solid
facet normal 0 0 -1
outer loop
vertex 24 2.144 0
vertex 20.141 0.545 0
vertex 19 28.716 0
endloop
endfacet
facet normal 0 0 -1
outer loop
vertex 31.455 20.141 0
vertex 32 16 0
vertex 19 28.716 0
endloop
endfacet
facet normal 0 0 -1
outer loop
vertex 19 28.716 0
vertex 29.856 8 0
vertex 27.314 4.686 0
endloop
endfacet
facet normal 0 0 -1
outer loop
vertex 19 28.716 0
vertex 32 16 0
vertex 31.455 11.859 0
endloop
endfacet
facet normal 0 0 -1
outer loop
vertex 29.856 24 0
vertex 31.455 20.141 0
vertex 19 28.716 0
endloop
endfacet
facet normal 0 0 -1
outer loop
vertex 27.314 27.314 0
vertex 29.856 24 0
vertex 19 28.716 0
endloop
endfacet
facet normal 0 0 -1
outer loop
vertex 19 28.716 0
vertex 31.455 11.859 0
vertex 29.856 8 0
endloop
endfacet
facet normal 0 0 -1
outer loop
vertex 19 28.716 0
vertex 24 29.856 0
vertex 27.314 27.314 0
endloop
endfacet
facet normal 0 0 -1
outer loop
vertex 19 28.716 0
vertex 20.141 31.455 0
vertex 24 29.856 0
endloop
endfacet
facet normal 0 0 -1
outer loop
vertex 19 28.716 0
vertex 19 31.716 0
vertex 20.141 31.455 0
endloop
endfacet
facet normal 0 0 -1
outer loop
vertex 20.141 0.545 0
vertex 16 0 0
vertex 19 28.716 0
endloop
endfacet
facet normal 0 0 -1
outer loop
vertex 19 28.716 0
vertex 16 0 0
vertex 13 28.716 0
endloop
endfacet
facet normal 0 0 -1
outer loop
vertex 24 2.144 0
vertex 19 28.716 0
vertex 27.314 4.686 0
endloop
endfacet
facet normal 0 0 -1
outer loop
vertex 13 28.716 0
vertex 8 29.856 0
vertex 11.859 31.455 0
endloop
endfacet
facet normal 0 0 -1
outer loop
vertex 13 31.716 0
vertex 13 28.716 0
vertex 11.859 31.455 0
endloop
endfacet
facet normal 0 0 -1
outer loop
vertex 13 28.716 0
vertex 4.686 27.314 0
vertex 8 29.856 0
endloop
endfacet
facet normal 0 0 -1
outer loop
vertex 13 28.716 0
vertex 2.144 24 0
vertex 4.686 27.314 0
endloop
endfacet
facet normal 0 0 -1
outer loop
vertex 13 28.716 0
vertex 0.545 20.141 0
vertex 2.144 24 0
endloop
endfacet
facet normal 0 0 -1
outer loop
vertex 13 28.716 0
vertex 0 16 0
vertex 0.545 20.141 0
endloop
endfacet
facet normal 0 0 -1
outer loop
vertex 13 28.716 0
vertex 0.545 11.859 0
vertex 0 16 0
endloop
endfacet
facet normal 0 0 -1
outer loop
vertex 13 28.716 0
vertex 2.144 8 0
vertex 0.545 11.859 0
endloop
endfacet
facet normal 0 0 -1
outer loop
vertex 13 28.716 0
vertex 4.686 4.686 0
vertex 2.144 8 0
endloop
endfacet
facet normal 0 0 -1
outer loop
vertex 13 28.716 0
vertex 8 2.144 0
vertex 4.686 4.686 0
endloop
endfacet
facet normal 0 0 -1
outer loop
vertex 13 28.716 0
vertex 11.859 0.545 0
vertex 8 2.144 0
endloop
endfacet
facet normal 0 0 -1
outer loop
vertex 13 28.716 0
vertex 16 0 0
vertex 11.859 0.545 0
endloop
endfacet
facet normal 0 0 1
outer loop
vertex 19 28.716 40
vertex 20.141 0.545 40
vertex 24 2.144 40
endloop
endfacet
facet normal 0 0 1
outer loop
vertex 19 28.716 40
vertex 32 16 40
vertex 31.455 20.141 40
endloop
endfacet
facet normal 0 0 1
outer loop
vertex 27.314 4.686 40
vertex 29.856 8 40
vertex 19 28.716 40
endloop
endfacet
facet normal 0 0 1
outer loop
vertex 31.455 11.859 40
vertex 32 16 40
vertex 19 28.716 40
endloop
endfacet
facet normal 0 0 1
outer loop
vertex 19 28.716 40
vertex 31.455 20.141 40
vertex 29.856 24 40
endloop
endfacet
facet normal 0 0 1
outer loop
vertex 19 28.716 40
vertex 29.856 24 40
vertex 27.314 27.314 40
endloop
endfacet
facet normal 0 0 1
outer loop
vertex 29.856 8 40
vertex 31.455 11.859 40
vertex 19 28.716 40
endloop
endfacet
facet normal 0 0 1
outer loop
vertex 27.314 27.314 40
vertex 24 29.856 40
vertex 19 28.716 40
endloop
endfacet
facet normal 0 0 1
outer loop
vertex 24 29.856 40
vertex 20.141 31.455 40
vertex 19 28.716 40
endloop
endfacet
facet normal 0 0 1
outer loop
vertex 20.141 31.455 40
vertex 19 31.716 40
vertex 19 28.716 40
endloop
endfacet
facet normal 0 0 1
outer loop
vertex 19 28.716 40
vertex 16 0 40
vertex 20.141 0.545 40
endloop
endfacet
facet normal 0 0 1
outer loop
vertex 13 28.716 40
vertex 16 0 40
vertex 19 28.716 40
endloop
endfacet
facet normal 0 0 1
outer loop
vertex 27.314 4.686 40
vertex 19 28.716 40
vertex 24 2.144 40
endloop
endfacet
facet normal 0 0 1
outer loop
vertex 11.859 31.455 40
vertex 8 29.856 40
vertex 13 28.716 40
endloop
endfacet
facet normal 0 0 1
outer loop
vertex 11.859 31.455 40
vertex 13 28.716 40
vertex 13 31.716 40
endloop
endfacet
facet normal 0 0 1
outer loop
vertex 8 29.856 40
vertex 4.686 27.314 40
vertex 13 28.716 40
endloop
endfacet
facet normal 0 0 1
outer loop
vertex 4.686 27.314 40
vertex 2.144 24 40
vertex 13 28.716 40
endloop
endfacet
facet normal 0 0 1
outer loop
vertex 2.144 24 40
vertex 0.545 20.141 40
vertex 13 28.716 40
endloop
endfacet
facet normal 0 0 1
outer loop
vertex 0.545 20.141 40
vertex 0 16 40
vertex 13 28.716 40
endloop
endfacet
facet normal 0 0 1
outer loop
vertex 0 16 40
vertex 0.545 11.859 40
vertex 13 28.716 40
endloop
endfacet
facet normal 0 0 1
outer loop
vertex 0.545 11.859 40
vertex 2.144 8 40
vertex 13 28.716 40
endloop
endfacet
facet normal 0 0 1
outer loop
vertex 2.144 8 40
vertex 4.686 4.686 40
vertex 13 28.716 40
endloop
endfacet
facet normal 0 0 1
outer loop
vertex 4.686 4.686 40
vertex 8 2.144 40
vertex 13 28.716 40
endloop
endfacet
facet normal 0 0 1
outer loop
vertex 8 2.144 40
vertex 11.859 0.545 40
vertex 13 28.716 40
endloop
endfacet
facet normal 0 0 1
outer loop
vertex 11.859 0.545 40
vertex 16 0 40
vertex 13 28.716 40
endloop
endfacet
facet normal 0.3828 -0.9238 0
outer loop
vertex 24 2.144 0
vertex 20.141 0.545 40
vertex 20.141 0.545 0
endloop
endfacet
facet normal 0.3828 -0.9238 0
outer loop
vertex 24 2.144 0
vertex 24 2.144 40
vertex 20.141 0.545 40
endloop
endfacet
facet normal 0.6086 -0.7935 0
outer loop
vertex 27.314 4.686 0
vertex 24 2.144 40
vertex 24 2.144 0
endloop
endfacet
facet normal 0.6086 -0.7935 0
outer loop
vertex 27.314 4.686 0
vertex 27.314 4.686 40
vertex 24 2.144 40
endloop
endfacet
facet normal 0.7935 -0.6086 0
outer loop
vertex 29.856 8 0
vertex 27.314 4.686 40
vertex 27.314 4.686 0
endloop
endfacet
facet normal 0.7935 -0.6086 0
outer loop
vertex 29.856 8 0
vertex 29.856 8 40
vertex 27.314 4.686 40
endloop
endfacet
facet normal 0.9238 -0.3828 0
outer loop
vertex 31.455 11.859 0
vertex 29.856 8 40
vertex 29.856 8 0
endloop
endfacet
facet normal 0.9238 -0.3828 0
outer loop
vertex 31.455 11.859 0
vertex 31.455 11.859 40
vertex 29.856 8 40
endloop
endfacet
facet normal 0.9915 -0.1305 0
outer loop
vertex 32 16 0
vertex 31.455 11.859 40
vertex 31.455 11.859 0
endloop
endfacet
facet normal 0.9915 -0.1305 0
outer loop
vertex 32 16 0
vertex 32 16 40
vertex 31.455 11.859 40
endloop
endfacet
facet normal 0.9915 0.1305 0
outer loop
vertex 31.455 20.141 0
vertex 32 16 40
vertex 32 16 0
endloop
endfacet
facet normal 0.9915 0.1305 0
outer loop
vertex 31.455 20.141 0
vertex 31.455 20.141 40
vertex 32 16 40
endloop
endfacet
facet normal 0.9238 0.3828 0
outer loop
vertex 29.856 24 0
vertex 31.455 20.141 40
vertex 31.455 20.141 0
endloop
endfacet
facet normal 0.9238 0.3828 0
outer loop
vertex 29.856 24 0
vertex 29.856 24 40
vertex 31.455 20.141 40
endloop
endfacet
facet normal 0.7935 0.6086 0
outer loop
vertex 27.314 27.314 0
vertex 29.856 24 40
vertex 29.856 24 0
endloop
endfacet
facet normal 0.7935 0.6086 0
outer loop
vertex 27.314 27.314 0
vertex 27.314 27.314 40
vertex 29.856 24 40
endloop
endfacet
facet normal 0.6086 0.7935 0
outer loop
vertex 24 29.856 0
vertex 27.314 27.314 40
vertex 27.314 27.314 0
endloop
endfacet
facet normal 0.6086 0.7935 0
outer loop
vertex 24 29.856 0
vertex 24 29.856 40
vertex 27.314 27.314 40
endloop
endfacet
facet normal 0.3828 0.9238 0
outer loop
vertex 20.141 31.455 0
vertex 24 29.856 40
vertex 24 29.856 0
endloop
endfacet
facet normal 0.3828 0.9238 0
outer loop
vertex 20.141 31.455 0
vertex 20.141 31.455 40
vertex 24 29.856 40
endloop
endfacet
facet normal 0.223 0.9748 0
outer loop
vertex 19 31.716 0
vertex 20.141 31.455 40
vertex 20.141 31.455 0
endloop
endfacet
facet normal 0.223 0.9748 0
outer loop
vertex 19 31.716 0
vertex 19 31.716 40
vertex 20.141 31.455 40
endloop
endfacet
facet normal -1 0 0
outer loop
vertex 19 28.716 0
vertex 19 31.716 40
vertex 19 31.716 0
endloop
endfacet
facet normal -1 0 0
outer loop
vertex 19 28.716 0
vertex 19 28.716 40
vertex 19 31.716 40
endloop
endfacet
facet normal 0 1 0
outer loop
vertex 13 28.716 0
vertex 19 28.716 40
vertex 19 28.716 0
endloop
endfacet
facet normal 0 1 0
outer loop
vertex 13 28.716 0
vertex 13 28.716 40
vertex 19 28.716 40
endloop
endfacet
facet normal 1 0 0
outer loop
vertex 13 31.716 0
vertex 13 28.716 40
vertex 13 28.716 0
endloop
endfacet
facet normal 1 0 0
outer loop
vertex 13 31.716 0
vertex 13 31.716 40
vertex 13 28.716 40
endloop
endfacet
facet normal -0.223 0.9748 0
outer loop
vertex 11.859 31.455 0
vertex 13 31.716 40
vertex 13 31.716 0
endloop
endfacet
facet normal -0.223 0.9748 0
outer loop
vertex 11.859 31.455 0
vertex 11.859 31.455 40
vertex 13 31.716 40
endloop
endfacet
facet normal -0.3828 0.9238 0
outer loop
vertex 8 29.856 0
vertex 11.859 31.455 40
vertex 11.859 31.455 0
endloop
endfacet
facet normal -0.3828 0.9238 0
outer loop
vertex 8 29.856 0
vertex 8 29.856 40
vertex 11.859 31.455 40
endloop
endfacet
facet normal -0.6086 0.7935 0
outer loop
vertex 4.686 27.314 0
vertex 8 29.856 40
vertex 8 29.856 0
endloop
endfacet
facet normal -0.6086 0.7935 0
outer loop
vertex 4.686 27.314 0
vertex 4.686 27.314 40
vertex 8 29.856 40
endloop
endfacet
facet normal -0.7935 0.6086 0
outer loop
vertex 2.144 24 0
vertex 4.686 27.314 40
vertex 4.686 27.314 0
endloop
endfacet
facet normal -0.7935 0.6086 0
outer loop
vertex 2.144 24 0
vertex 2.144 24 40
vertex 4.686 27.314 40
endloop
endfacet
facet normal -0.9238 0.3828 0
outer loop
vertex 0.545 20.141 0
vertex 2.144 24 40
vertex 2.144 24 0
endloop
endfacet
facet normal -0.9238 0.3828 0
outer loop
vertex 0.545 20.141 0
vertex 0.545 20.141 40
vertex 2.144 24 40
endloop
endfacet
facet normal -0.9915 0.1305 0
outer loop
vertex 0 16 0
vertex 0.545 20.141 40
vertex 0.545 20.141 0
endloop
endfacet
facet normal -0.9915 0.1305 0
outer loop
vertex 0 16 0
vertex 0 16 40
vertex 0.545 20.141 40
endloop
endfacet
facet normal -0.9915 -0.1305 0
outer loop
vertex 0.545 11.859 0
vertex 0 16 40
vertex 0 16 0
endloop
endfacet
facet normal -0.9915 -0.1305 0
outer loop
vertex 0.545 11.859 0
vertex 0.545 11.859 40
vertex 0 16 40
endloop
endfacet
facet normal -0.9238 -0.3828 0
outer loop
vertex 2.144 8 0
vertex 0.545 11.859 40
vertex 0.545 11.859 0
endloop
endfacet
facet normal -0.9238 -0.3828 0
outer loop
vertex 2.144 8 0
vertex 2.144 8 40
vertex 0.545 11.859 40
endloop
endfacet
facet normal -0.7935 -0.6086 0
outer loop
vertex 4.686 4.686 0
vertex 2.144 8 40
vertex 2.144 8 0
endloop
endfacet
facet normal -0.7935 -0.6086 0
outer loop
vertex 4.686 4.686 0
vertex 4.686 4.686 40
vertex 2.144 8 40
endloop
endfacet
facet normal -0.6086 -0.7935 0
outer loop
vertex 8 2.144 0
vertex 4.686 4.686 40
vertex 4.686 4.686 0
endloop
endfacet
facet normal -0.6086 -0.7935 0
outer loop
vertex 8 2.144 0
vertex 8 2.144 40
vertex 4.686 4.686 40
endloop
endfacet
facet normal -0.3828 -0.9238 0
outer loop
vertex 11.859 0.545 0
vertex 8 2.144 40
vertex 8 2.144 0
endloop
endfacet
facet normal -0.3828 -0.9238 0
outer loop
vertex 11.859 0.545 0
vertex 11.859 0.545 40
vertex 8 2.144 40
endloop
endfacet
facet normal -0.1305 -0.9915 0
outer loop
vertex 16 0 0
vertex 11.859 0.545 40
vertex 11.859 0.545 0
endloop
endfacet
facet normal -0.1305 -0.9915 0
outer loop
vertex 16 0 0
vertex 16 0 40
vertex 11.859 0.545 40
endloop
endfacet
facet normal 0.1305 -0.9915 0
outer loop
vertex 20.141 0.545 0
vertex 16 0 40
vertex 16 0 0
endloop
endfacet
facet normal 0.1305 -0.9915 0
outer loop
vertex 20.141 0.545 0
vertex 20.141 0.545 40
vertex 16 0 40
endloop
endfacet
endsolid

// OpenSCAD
$fn = 32;

// ----------------------------------------------------------------------
// Keyway shaft: d32 shaft, key 6 x 3 mm
// ----------------------------------------------------------------------

// --- parameters (mm) ---
shaft_r = 16;             // shaft radius
key_w = 6;                // keyway width
key_d = 3;                // keyway depth below the surface line
plate_t = 40;             // shaft length, Z (extrusion height)

shaft_d = 2 * shaft_r;  // shaft diameter
circle_step = 15;  // polygon sampling step, degrees

profile = [[11.859, 31.455], [8, 29.856], [4.686, 27.314], [2.144, 24], [0.545, 20.141], [0, 16], [0.545, 11.859], [2.144, 8], [4.686, 4.686], [8, 2.144], [11.859, 0.545], [16, 0], [20.141, 0.545], [24, 2.144], [27.314, 4.686], [29.856, 8], [31.455, 11.859], [32, 16], [31.455, 20.141], [29.856, 24], [27.314, 27.314], [24, 29.856], [20.141, 31.455], [19, 31.716], [19, 28.716], [13, 28.716], [13, 31.716]];  // primary outline, 27 points, counter clockwise

// --- the one profile operation ---
linear_extrude(height = plate_t) polygon(points = profile);
